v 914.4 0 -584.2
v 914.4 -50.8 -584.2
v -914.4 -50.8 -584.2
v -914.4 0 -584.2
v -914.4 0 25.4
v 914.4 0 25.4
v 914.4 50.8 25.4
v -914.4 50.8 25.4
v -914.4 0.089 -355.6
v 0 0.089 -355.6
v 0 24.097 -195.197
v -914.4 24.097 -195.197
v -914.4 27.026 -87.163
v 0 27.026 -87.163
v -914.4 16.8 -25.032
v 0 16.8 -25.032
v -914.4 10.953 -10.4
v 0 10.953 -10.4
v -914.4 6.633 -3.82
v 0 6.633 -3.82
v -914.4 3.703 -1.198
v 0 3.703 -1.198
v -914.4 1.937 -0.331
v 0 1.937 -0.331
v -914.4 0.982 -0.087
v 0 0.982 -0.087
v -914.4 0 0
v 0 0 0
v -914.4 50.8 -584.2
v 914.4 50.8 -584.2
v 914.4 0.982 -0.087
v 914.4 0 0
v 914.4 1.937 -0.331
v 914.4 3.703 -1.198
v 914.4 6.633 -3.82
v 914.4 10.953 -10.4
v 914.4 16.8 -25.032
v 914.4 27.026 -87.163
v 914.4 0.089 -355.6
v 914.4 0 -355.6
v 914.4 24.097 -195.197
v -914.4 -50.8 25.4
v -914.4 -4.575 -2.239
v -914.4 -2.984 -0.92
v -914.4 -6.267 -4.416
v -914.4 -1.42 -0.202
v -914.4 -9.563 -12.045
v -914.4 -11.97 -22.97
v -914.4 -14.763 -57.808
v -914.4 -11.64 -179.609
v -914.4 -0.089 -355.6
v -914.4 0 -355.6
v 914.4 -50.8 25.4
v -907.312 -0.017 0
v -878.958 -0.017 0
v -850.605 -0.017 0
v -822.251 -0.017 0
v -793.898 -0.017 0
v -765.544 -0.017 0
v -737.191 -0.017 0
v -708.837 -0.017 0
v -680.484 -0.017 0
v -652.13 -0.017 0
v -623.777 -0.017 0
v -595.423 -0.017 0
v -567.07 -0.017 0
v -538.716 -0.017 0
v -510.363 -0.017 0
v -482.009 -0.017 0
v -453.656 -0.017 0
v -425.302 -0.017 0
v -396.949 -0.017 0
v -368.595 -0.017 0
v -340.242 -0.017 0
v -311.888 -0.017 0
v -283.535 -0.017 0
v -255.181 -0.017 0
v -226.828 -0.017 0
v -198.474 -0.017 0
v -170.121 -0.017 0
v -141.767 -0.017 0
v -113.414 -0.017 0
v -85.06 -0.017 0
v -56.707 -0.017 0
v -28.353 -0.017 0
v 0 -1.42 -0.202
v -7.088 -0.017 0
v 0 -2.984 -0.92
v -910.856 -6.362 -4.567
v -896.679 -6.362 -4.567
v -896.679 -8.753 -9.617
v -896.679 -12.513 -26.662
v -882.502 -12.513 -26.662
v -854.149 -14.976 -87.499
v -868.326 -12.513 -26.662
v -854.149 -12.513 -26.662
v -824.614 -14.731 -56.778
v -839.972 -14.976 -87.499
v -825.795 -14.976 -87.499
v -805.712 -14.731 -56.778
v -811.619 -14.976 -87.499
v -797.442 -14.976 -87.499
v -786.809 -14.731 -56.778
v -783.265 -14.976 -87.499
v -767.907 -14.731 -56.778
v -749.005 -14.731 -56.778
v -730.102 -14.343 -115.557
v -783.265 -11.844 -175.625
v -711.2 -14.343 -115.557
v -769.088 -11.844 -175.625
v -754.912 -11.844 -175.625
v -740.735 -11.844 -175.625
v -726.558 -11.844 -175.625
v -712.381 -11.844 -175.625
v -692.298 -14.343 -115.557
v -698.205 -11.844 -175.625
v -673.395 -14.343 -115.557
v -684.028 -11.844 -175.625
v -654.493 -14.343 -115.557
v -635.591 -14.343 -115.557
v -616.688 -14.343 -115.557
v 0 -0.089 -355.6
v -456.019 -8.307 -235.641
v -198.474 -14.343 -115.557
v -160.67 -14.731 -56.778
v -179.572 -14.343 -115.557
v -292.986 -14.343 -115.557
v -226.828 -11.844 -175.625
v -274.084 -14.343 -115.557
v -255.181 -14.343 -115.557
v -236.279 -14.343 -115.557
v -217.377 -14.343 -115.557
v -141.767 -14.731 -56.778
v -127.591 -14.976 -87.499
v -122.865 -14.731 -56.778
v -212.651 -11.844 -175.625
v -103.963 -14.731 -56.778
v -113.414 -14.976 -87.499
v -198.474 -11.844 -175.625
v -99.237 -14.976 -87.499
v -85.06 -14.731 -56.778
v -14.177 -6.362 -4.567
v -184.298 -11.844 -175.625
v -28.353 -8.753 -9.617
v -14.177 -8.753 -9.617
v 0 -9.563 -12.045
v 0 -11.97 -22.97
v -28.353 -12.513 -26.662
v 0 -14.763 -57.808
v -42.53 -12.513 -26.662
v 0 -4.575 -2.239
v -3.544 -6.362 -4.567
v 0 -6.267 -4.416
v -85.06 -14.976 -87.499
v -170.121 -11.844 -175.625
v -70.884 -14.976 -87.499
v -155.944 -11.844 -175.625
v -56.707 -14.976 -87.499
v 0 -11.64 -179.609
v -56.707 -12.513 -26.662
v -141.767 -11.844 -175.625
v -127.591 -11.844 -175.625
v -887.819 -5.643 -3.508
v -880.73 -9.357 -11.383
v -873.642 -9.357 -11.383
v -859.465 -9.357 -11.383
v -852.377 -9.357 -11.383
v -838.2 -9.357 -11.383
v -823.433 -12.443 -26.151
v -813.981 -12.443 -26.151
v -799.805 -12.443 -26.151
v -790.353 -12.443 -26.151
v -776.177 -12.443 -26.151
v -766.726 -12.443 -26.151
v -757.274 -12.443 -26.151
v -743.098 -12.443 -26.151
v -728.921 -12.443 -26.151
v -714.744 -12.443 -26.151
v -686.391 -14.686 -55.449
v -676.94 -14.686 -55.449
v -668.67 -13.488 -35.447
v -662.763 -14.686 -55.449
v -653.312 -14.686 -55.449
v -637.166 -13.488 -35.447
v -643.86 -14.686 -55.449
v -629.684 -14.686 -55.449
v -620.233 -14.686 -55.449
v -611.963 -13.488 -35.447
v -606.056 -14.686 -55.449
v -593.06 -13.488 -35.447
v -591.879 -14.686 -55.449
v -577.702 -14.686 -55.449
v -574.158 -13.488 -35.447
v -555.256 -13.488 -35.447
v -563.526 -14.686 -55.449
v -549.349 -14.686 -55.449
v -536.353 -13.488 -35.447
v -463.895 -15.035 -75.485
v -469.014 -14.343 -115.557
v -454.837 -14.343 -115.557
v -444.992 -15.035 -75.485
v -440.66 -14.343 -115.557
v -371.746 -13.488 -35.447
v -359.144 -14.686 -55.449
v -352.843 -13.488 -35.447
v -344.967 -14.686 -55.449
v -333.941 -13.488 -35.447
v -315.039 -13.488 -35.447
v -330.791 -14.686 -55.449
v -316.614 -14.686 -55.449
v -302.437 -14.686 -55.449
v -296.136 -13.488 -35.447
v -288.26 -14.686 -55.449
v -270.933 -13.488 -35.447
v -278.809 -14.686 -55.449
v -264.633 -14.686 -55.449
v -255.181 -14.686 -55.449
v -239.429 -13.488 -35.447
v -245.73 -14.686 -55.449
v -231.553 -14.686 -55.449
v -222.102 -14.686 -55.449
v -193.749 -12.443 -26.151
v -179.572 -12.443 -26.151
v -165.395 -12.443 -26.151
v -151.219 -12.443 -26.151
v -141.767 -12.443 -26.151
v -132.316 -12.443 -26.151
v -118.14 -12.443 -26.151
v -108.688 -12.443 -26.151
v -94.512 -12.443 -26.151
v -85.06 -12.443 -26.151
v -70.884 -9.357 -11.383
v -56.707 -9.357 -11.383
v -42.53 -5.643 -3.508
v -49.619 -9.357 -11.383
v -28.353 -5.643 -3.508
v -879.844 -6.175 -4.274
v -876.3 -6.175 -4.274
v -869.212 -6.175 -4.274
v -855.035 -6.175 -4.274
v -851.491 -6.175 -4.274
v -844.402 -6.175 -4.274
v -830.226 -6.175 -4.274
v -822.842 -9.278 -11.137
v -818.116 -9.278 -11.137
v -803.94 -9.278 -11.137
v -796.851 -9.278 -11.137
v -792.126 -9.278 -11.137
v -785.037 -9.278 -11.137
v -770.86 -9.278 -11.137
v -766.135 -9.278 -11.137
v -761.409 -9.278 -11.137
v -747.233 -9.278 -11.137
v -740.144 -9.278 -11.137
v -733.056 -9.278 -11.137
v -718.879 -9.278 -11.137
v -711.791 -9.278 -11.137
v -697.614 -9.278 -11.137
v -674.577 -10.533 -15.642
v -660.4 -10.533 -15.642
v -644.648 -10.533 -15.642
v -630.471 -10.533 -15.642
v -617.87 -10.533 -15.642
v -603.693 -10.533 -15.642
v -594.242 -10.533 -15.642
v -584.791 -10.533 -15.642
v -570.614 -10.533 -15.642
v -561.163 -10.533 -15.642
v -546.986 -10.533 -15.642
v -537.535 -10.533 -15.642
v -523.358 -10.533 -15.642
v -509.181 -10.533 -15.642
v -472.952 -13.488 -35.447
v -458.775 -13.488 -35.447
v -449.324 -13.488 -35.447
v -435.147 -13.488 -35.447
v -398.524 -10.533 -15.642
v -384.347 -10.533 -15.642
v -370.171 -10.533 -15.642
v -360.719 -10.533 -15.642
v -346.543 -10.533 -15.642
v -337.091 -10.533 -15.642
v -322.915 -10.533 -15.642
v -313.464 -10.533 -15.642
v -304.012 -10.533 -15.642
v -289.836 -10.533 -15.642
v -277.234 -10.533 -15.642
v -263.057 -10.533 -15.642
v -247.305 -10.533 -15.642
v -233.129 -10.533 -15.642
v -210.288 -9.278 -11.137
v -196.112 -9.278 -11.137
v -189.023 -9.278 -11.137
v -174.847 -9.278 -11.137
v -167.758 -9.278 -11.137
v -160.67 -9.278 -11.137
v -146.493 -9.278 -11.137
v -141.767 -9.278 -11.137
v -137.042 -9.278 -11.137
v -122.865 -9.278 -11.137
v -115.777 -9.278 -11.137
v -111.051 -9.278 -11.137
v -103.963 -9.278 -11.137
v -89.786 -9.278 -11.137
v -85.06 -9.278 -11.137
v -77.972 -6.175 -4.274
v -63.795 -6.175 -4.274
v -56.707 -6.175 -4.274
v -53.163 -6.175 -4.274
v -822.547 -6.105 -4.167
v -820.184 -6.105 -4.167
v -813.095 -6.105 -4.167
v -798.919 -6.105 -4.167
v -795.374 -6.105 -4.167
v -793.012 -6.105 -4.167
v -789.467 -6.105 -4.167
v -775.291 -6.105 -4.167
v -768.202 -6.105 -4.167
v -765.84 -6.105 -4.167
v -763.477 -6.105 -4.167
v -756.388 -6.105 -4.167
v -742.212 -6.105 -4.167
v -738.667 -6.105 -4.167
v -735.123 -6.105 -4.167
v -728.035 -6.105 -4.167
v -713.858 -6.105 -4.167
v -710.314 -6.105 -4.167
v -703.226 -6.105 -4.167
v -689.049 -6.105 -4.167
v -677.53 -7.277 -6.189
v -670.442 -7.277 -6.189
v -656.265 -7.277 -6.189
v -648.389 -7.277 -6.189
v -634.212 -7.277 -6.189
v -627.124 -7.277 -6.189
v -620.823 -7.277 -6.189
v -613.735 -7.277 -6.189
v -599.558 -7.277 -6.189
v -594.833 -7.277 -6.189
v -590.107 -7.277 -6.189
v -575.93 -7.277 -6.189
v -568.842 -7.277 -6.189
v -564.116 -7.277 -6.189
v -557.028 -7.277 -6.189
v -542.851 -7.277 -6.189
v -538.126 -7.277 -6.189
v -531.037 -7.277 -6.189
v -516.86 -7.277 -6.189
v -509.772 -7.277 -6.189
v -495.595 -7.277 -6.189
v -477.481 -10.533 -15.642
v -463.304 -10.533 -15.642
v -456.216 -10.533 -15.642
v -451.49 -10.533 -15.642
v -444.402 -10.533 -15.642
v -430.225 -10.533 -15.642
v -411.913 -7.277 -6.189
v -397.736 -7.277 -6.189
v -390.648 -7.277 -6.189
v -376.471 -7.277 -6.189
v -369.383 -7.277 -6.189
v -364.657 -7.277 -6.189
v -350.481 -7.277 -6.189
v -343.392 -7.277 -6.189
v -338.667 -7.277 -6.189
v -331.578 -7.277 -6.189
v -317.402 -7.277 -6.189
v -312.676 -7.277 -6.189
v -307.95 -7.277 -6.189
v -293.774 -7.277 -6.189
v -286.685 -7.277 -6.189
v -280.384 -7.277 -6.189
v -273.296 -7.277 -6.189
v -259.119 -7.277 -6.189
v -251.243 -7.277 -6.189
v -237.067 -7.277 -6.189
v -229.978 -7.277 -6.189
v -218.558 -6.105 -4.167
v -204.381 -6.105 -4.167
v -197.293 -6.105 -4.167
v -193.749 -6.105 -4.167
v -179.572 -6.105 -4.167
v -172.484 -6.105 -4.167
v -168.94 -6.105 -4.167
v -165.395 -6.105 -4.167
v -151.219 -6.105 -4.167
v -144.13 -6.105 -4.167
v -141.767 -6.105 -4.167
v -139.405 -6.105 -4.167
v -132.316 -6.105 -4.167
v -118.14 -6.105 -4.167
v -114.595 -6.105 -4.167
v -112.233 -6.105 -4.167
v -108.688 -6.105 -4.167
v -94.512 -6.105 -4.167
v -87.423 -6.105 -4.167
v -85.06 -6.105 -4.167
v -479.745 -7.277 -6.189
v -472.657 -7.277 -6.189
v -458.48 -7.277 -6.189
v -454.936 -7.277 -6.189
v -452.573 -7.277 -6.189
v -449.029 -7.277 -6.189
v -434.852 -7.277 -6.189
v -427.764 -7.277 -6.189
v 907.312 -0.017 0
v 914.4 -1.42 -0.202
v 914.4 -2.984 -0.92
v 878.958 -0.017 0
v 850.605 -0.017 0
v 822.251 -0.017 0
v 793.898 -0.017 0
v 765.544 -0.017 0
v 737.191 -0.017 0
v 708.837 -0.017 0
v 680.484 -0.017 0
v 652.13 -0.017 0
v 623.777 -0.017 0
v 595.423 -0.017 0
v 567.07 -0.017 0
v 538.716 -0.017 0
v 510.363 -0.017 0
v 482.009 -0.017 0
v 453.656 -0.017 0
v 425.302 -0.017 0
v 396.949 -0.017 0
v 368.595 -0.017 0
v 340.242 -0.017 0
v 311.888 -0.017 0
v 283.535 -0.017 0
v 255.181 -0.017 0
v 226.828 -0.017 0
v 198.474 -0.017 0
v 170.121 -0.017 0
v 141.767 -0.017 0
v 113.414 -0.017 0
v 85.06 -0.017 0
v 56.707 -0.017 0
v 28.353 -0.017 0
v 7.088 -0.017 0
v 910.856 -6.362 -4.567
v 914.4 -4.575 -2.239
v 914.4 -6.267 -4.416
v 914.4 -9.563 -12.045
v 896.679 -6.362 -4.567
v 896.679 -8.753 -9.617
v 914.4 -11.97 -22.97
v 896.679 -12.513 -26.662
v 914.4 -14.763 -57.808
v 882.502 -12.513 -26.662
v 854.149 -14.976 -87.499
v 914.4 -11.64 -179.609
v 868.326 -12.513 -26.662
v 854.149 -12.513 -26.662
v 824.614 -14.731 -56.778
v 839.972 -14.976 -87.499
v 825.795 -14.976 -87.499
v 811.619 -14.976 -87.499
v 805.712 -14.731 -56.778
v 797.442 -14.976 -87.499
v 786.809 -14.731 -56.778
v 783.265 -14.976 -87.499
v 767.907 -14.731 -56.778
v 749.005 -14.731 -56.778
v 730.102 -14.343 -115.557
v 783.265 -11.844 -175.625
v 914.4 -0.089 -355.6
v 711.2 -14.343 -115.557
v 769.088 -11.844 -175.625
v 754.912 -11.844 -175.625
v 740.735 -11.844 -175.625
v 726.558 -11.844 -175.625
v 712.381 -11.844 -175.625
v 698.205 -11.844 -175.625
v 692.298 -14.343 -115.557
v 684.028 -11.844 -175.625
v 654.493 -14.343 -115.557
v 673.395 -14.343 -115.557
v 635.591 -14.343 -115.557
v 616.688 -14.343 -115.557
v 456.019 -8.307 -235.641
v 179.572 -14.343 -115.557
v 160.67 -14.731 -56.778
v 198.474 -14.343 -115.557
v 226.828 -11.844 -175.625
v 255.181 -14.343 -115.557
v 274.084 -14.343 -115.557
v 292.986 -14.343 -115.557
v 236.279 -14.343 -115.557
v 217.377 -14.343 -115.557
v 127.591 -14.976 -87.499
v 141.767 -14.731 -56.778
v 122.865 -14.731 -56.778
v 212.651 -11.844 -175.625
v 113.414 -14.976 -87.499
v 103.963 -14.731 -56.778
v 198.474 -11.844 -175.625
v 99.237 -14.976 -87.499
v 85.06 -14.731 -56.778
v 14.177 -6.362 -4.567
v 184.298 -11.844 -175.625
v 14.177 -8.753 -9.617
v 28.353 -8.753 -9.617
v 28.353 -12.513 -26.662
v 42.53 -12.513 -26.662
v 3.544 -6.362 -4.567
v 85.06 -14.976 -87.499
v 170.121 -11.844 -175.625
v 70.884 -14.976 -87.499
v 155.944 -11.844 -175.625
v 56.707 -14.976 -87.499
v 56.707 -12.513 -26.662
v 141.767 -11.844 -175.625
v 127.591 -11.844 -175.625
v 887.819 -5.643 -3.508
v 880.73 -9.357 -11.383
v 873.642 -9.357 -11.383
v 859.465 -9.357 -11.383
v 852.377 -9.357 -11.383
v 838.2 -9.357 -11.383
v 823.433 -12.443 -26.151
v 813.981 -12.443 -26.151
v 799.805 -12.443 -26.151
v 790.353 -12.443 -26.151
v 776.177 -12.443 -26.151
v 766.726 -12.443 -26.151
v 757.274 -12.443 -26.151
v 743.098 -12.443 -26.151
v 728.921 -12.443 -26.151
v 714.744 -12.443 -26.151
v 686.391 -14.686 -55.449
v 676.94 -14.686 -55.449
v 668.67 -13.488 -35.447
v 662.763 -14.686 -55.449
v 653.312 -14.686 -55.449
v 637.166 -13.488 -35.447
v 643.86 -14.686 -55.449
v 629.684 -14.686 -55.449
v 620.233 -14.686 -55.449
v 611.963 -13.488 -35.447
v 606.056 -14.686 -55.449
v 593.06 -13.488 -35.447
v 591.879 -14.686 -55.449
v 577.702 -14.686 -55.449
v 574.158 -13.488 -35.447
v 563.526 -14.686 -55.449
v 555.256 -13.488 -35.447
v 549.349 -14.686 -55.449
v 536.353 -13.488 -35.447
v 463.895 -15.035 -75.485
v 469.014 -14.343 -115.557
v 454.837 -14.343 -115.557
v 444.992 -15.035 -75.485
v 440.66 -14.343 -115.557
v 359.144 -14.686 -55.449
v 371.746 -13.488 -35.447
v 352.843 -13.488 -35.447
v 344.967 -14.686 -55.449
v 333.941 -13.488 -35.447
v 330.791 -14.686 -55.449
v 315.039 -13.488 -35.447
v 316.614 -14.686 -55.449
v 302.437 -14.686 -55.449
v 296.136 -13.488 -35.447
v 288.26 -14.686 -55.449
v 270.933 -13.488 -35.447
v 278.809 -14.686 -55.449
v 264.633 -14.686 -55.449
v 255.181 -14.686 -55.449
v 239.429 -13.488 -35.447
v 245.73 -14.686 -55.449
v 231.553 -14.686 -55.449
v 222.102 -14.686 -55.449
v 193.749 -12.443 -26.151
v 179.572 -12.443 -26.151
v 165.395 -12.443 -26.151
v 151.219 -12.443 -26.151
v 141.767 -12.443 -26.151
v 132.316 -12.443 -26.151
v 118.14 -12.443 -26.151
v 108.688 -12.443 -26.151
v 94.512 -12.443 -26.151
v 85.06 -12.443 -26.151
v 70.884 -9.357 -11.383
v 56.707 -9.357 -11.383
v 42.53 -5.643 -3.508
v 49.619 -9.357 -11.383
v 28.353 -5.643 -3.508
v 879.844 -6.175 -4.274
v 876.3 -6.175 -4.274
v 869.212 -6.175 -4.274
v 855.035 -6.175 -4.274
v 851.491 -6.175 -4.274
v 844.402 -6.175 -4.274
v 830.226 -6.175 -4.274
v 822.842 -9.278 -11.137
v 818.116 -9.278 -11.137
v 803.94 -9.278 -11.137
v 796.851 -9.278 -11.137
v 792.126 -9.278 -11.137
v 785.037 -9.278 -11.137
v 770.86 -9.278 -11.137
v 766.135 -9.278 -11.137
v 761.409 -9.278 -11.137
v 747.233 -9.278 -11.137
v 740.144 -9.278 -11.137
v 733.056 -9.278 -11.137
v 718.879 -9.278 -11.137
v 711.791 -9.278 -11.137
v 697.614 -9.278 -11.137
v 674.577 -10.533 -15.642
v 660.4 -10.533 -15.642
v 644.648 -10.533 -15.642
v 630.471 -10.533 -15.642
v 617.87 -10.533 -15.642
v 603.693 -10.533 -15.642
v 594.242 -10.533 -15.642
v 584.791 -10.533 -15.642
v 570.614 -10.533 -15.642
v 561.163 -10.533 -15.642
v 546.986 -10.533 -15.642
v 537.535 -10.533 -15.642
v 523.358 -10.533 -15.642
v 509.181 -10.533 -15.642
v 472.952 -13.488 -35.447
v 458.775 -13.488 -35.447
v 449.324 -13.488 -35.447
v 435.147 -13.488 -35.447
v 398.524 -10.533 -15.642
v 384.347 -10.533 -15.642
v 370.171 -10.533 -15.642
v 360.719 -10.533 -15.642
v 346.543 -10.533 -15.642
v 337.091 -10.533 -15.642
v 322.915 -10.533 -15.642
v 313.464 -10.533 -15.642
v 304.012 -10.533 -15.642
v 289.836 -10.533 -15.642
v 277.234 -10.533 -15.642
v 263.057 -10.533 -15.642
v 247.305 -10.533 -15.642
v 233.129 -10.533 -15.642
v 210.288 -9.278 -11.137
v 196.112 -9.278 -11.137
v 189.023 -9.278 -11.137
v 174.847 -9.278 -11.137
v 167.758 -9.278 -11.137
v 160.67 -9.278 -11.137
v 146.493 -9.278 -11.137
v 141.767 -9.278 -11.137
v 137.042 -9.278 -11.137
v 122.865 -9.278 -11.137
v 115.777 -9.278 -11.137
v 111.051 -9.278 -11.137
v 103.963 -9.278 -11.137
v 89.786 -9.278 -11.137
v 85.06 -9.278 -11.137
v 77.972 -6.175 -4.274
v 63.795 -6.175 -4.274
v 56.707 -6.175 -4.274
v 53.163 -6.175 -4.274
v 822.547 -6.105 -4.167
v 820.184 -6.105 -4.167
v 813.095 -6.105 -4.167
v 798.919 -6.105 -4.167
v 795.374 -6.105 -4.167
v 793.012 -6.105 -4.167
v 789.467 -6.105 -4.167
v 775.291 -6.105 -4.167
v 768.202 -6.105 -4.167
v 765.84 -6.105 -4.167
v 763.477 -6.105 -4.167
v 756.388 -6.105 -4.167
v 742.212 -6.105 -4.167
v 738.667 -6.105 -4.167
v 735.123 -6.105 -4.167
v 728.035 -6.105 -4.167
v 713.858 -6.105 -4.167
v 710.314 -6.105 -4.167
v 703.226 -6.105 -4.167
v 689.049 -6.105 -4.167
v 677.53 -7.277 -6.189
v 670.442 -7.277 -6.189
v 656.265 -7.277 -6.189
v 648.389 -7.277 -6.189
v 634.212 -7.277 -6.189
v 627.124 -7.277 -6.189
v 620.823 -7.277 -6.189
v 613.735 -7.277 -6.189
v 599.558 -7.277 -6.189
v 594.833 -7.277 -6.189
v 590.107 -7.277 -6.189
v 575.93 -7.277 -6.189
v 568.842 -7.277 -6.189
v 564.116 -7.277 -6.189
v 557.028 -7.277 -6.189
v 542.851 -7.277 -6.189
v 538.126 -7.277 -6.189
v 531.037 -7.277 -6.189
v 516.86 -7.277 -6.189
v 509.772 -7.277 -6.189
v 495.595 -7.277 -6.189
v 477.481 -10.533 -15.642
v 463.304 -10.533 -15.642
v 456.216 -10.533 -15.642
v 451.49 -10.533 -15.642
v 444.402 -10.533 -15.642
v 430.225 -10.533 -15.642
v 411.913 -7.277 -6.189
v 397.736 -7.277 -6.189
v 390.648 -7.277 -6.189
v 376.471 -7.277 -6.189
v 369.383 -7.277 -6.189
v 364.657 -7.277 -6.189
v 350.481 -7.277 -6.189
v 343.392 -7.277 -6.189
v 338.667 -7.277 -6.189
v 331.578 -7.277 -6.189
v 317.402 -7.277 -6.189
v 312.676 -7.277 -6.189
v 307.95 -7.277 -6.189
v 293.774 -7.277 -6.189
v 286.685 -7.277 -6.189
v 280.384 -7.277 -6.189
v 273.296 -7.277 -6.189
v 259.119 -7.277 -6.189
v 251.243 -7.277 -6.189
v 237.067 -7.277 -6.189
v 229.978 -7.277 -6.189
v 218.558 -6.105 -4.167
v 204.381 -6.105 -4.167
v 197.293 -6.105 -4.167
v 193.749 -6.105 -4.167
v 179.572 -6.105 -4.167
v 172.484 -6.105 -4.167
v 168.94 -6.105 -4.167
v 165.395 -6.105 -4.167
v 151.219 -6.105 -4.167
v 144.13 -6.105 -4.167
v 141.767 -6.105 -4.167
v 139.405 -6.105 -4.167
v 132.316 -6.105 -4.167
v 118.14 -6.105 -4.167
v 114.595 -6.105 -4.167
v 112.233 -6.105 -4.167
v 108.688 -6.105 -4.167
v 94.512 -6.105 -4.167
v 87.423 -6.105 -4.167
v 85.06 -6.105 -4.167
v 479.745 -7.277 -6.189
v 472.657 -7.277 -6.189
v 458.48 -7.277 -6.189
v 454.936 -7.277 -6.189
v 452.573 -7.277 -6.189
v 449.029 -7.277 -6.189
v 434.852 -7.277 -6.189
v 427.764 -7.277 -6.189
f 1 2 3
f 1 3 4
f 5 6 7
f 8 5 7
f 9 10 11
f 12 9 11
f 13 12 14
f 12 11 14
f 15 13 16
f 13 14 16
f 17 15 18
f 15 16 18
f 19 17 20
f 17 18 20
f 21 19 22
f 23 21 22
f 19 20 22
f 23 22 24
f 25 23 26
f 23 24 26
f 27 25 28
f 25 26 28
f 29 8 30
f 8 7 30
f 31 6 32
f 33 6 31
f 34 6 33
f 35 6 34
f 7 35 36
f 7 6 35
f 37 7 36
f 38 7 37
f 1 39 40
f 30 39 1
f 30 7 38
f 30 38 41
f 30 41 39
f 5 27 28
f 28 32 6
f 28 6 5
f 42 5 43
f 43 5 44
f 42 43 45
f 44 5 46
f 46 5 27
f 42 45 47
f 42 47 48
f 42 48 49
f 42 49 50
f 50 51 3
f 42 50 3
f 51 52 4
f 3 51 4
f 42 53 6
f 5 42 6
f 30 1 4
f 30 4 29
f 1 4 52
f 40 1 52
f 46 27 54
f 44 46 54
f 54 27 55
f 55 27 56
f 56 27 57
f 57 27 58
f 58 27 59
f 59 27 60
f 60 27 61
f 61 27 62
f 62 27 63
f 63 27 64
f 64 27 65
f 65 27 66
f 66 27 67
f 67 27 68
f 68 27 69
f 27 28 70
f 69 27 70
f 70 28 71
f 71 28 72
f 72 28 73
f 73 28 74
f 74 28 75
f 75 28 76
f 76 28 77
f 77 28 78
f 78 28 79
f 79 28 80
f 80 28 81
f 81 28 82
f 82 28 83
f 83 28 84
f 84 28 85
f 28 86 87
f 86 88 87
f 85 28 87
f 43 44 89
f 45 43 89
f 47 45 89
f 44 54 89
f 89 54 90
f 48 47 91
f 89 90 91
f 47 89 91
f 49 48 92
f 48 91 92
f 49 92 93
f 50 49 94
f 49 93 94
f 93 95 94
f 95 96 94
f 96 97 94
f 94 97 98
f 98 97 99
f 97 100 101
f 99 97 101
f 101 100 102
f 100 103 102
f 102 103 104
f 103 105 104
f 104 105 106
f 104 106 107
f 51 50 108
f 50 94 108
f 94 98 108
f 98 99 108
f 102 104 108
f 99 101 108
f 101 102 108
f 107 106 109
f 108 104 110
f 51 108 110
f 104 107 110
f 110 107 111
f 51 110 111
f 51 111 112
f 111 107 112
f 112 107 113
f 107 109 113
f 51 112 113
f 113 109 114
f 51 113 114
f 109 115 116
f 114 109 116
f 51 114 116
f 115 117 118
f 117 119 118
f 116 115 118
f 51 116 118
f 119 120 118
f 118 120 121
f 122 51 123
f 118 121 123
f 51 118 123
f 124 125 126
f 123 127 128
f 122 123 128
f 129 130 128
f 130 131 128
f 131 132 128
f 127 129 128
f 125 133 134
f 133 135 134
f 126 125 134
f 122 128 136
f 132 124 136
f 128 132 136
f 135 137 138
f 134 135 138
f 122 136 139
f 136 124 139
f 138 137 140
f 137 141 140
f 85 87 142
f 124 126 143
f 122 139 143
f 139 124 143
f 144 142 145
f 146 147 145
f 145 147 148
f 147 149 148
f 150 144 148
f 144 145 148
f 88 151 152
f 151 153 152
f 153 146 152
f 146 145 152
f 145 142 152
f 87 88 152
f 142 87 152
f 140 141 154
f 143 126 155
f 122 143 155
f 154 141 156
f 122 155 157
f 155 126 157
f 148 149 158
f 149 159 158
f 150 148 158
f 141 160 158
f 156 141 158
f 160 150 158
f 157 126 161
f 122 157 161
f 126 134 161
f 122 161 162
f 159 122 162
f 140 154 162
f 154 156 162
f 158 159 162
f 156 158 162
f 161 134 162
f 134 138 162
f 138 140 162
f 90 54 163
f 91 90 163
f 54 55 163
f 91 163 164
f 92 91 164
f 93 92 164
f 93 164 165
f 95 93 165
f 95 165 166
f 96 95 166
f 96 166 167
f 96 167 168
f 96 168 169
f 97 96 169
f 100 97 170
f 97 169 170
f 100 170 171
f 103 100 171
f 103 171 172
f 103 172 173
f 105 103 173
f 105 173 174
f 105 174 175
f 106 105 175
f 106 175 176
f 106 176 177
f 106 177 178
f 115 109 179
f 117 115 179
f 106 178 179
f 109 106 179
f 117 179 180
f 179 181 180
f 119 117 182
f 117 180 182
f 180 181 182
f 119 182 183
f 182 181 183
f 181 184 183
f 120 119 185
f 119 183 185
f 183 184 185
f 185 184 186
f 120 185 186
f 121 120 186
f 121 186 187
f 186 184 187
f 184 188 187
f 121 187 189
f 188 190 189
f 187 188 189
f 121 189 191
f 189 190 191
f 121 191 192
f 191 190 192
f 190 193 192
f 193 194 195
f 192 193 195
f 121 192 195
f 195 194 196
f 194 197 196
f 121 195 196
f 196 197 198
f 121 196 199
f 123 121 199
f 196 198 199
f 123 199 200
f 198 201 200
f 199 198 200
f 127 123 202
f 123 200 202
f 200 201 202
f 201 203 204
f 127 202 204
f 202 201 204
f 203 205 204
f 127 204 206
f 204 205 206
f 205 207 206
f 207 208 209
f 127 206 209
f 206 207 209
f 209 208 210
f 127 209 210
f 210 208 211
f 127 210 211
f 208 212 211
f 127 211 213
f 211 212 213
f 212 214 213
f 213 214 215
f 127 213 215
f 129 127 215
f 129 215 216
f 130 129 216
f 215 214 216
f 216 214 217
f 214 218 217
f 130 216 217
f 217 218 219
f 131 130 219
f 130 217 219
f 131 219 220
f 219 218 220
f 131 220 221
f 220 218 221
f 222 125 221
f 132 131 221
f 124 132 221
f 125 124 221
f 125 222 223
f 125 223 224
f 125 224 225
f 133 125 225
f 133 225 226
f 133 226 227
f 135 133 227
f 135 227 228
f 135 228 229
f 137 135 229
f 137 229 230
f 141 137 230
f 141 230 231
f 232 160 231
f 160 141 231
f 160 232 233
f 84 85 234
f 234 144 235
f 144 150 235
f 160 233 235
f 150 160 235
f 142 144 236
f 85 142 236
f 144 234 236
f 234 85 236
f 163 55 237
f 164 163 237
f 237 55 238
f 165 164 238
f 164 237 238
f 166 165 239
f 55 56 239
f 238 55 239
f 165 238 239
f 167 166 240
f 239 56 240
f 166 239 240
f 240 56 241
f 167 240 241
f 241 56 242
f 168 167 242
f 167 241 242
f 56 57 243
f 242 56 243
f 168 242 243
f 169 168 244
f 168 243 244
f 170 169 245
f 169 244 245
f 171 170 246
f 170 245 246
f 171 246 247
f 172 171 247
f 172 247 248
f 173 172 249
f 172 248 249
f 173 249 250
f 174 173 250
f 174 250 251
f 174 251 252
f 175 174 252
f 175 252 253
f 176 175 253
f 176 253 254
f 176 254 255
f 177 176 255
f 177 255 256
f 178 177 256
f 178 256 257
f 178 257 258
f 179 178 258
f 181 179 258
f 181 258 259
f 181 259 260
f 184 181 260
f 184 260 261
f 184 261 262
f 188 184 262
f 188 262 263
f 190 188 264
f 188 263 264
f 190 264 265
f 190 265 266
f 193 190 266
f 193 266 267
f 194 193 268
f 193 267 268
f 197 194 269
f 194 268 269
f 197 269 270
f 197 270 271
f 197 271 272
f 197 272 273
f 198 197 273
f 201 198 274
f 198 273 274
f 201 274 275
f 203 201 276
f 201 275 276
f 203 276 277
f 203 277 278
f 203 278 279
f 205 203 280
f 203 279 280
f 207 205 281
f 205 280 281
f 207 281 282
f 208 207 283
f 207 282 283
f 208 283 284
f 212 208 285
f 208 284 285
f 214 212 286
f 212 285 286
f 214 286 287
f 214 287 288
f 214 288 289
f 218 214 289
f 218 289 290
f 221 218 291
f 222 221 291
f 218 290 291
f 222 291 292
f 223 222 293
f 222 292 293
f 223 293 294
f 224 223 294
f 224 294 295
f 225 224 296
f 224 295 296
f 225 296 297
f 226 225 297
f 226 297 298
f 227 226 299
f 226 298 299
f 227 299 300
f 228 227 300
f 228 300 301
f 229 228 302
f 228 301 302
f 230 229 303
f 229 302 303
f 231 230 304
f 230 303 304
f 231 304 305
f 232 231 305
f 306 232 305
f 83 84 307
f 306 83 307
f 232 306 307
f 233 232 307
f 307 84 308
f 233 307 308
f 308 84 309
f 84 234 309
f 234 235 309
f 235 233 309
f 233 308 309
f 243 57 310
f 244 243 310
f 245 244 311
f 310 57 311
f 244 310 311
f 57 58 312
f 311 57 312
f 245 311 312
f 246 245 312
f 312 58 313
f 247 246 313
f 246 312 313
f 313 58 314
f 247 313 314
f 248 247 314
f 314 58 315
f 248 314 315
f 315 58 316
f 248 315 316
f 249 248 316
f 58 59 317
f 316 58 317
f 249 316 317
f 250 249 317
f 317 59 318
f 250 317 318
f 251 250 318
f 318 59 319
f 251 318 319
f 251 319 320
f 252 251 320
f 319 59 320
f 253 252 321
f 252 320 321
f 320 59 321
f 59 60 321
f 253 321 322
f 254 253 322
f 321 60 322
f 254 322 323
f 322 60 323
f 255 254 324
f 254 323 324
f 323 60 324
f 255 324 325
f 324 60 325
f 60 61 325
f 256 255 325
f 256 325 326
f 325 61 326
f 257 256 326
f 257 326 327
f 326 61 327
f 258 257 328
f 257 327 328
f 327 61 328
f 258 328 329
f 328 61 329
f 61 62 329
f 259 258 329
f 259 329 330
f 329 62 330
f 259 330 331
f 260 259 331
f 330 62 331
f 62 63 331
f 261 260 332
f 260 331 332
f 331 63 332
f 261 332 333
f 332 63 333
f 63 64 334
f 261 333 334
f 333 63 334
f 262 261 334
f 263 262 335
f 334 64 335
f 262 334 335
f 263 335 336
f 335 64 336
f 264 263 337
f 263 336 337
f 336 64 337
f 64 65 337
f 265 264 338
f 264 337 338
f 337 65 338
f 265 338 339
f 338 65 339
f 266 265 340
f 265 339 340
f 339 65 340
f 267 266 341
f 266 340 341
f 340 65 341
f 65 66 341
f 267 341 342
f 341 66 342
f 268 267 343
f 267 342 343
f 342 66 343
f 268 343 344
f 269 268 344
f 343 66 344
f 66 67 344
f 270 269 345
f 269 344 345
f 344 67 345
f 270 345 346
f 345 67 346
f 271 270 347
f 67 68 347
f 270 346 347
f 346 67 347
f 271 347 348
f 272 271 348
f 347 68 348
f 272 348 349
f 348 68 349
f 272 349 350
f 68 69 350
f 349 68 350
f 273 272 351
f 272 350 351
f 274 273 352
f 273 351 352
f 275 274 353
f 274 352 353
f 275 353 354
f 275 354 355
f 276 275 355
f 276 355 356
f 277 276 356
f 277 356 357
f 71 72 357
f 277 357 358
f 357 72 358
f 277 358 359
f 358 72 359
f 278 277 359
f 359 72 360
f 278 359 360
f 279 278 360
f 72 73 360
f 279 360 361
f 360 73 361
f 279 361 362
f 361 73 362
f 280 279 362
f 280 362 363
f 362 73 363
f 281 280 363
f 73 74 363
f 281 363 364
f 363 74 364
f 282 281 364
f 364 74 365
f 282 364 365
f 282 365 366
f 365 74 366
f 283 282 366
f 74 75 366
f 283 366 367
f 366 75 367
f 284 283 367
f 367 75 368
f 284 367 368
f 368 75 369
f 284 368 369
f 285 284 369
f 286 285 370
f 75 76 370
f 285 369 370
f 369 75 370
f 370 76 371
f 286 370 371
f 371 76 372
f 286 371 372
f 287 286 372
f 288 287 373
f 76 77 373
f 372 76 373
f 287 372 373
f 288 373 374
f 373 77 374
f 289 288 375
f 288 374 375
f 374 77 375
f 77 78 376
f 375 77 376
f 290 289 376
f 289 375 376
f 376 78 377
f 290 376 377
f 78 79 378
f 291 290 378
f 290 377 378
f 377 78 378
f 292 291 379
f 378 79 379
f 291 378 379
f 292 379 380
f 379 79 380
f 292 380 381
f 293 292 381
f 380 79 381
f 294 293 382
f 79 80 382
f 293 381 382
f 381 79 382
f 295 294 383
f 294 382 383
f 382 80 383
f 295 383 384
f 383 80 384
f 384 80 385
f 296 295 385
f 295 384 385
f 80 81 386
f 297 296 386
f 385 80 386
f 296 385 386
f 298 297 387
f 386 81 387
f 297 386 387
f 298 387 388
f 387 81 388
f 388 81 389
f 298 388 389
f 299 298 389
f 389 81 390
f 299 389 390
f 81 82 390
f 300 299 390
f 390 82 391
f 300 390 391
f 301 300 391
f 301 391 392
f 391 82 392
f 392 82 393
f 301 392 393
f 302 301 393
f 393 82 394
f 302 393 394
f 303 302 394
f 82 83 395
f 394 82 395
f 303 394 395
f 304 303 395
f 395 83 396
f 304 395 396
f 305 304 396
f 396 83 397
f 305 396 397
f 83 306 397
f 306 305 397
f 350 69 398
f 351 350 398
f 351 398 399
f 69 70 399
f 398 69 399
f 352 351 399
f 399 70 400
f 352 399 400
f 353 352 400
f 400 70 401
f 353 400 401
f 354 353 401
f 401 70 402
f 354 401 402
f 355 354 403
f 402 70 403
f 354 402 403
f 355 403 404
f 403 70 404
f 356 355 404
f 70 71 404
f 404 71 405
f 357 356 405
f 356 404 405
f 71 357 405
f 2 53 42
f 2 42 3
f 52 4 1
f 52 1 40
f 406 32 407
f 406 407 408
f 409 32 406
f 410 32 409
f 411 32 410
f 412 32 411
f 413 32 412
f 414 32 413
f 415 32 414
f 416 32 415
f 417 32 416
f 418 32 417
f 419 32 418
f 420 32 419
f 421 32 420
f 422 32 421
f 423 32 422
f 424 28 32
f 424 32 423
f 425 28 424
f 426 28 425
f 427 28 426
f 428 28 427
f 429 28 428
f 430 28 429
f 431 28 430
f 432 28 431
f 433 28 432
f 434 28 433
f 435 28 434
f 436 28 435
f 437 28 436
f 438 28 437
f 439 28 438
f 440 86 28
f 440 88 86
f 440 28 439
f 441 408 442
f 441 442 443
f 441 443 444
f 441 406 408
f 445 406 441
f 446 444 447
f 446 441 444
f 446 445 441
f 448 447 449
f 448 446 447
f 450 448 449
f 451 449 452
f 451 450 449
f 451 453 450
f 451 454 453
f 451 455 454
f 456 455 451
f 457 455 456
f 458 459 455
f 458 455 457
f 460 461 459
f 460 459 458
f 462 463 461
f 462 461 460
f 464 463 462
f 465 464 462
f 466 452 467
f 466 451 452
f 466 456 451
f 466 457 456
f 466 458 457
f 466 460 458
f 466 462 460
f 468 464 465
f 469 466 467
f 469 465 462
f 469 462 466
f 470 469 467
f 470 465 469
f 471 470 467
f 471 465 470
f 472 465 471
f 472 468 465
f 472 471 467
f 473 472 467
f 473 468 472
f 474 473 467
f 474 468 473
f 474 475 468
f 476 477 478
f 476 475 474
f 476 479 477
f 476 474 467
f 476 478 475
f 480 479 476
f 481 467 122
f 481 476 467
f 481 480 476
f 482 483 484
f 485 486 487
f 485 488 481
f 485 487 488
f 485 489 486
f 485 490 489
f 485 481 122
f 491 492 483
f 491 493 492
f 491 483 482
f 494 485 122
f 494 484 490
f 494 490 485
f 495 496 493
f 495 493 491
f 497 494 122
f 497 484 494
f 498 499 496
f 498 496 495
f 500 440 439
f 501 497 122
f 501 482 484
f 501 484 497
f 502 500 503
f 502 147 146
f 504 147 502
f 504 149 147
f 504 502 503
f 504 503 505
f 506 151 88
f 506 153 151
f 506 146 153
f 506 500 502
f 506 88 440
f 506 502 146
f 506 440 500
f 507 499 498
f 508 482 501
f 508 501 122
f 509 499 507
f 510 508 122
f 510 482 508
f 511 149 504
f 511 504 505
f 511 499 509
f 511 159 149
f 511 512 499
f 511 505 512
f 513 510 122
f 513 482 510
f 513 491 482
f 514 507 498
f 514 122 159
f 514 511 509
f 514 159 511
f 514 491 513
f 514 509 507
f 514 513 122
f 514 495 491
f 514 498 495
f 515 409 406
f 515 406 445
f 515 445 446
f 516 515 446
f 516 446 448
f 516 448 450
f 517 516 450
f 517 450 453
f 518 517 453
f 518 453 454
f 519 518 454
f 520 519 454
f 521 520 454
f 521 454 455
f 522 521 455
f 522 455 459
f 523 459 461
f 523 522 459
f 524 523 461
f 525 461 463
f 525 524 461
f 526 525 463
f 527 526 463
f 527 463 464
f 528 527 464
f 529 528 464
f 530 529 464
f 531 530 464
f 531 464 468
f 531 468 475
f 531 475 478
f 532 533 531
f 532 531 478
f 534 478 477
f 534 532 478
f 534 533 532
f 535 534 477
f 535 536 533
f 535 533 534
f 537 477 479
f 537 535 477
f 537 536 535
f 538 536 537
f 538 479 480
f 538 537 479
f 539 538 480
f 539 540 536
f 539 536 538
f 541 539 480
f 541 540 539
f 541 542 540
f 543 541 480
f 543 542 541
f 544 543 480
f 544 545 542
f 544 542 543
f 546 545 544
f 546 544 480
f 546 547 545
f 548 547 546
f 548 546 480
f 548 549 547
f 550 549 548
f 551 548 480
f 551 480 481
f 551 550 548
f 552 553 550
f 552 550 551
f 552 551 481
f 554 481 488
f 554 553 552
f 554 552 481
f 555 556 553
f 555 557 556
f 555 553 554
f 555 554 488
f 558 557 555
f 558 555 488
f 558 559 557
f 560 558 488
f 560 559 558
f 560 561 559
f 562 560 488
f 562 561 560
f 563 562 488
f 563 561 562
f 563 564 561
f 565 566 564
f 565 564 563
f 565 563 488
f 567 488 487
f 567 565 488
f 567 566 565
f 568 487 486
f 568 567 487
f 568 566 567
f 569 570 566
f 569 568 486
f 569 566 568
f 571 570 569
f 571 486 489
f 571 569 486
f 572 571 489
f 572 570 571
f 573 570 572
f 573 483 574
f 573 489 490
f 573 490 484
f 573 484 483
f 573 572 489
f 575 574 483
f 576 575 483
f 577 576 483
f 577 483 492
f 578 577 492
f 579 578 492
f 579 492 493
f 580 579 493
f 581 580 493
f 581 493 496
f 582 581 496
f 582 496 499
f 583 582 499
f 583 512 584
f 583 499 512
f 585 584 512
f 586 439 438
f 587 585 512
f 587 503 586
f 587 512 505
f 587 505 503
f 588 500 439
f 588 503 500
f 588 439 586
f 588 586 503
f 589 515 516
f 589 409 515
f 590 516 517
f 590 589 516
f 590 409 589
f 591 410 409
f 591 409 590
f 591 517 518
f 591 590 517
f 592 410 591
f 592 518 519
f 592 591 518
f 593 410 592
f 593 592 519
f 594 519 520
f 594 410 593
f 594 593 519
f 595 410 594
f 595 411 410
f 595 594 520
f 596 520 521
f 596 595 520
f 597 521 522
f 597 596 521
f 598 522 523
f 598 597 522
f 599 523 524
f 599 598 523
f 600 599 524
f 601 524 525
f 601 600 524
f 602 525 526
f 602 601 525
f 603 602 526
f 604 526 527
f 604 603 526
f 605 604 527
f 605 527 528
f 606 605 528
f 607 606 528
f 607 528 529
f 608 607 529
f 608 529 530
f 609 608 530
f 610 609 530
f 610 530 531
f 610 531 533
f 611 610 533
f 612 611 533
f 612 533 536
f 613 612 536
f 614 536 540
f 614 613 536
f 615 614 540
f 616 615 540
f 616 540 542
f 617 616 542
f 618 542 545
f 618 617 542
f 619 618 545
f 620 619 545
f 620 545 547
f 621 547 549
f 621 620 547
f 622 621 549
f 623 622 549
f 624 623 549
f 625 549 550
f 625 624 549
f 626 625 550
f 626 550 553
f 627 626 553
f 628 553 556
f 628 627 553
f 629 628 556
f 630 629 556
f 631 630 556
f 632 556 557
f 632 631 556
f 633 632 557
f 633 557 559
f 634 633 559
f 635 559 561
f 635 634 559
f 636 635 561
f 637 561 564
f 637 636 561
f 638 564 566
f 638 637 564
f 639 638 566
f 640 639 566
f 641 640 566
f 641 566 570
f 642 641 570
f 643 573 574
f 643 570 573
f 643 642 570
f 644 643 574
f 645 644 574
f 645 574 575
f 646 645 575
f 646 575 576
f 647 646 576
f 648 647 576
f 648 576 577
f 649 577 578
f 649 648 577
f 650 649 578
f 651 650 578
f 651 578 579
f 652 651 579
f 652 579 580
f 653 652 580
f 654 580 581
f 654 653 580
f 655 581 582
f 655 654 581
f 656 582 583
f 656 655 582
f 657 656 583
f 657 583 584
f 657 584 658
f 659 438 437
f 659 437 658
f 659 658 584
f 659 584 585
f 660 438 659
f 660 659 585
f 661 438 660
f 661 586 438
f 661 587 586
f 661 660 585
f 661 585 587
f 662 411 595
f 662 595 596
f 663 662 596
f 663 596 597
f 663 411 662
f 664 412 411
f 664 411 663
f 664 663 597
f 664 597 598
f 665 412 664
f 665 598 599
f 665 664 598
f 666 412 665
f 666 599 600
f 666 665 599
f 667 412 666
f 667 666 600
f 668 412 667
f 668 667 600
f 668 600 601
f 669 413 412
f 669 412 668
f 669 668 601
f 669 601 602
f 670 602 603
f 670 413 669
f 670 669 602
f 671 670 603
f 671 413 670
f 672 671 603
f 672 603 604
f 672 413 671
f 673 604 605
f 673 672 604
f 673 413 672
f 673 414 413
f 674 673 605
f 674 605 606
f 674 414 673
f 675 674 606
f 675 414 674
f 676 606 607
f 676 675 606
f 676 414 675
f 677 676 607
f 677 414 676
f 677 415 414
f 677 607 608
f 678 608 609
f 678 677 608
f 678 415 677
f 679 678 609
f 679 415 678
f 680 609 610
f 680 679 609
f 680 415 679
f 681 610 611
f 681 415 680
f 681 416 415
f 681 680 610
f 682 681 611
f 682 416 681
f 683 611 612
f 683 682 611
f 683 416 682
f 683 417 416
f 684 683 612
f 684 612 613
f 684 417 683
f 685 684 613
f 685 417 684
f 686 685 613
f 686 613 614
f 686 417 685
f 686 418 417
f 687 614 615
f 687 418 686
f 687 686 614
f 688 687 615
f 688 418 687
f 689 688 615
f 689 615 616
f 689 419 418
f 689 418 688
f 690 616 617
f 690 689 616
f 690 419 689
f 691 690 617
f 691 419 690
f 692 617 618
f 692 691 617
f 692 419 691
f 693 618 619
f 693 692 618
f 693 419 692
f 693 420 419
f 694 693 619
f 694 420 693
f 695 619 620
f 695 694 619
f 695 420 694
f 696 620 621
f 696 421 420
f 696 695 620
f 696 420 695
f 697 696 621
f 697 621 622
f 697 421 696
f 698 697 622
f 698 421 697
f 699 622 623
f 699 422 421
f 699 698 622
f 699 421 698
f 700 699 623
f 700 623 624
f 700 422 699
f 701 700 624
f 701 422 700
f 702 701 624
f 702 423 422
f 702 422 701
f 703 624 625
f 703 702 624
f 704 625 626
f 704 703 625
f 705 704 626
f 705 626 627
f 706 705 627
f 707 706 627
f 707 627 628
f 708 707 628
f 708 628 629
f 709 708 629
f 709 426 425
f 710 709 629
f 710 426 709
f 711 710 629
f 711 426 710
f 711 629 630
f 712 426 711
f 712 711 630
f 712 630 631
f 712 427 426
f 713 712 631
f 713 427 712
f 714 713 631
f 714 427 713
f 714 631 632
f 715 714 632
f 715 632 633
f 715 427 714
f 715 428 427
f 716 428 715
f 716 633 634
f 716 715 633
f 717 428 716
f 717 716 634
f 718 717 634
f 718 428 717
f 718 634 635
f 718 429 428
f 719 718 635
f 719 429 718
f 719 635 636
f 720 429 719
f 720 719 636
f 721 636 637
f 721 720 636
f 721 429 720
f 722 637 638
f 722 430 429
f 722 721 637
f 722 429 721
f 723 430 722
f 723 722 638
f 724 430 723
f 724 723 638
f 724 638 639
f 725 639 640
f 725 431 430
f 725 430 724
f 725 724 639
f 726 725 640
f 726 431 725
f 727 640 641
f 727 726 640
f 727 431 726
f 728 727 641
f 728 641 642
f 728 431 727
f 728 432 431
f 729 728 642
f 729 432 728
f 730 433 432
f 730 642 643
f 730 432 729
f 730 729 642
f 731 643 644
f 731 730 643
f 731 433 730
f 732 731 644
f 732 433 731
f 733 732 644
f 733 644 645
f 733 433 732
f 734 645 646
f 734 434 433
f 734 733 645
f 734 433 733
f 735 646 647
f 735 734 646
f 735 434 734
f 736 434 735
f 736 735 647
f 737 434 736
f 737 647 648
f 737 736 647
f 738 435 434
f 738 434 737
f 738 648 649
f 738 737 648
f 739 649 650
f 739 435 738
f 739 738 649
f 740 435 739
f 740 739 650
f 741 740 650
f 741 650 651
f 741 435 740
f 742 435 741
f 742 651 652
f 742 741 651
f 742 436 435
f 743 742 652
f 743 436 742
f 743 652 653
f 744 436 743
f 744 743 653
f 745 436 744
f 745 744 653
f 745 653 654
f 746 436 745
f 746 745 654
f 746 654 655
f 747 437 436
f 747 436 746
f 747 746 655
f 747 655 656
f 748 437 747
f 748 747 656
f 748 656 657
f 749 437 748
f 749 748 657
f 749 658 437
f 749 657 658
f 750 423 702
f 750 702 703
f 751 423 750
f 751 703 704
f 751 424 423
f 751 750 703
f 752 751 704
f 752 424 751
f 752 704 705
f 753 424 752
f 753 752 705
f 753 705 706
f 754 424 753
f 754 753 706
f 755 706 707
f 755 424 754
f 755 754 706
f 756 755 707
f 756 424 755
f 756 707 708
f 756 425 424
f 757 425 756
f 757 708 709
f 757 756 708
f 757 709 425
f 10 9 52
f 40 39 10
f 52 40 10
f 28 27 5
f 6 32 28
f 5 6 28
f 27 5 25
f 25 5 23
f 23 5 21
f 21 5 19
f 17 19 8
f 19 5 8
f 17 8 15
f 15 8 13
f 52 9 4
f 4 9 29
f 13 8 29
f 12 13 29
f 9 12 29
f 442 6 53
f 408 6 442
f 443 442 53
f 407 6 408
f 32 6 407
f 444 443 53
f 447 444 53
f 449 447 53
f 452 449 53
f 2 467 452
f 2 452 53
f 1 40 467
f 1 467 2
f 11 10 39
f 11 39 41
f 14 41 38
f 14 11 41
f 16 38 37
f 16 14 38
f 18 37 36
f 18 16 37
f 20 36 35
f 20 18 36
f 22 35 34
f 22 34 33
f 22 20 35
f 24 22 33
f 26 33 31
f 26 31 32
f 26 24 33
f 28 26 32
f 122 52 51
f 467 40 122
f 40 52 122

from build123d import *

# Parameters (mm, degrees)
SKETCH1_W           = 609.6
SKETCH1_H           = 101.6
BOSS_EXTRUDE1_DEPTH = 914.4


with BuildPart() as part:
    # Sketch1 → Boss-Extrude1 (new, symmetric)
    with BuildSketch(Plane(origin=(0, 0, 0), x_dir=(0, 0, -1), z_dir=(1, 0, 0))):
        with Locations((279.4, 0)):
            Rectangle(SKETCH1_W, SKETCH1_H)
        with BuildLine():
            Line((355.599995778, 0.088899993), (355.600004222, -0.088899993))
            add(Edge.make_bspline(
                [(355.599995778, 0.088899993), (353.719919628, 0.484485581), (349.962916086, 1.274994229), (344.321357204, 2.408274034), (338.683668583, 3.512244286), (333.050236726, 4.587785987), (327.422693692, 5.639432655), (321.802334741, 6.668857961), (314.329135268, 8.011385096), (303.170369871, 9.958422722), (290.194287361, 12.107358077), (277.289771757, 14.118748691), (266.32724231, 15.739151064), (251.90729176, 17.753444463), (237.620805882, 19.578238431), (223.484571155, 21.221203013), (213.079958676, 22.35244674), (202.818953541, 23.390777248), (192.711844061, 24.335220131), (182.768771906, 25.183158052), (172.999706974, 25.930638246), (161.8755037, 26.675974905), (149.491704209, 27.346118936), (135.950809215, 27.840399909), (122.906863741, 28.059891495), (110.38955742, 28.000634334), (99.672207938, 27.700985353), (90.667971982, 27.262292799), (83.279992978, 26.775857592), (76.166179431, 26.181085385), (69.333698868, 25.483651689), (62.78942488, 24.68967134), (56.539916188, 23.805557546), (50.591433903, 22.837910647), (44.949952532, 21.793499475), (39.621112912, 20.679278548), (35.38459791, 19.684279107), (31.410842402, 18.666344518), (28.39403653, 17.828103782), (25.494164793, 16.950750808), (23.438681715, 16.293491786), (21.46678011, 15.626915769), (19.578952701, 14.951912739), (17.775664606, 14.269365904), (16.057362792, 13.580122722), (14.424466236, 12.885010511), (12.877370576, 12.184822001), (11.41645423, 11.480293146), (10.042056179, 10.772140432), (8.754511409, 10.060984054), (7.554107415, 9.347425864), (6.441119863, 8.631976574), (5.415793041, 7.915079727), (4.478345909, 7.197107261), (3.628976492, 6.478343988), (2.867864561, 5.758991675), (2.195190165, 5.03915146), (1.611133495, 4.318845026), (1.115921313, 3.59800481), (0.709825307, 2.87650933), (0.393271271, 2.15423771), (0.166504254, 1.431146413), (0.030737644, 0.707331331), (-0.01510981, 0.002329326), (0.030103712, -0.683215048), (0.166757283, -1.346959587), (0.393300202, -2.005722915), (0.709982051, -2.657303726), (1.116181328, -3.299762384), (1.611583629, -3.931365111), (2.19588676, -4.550541061), (2.868853595, -5.155873444), (3.630284522, -5.746072074), (4.479990283, -6.319989017), (5.41777842, -6.876617983), (6.443440476, -7.415118179), (7.556746328, -7.934809954), (8.757450602, -8.435162267), (10.04527274, -8.915818462), (11.419918332, -9.376544391), (12.881056499, -9.817279011), (14.428342684, -10.238048563), (16.061401534, -10.639008832), (17.779837371, -11.020391175), (19.583230149, -11.382503507), (21.471138203, -11.72569046), (23.443096697, -12.050327435), (25.498615858, -12.356818022), (27.637186796, -12.645541454), (29.858278076, -12.916863624), (32.161337168, -13.17112178), (35.392871871, -13.492971246), (39.633515491, -13.851127367), (44.961680314, -14.209933523), (50.602431788, -14.504901453), (56.550155093, -14.736048774), (62.798888687, -14.903214972), (69.342369229, -15.006422563), (76.174024321, -15.046294155), (83.286967172, -15.024333631), (90.674025931, -14.943132189), (98.327760574, -14.806320398), (106.240488655, -14.618358339), (114.404261409, -14.384158225), (122.810873499, -14.108588395), (131.451881899, -13.795890053), (140.318604404, -13.449239271), (149.402126747, -13.070337509), (161.921237989, -12.516505896), (174.697664724, -11.901159381), (187.718132989, -11.217108995), (197.744296345, -10.659602088), (207.929345735, -10.062346652), (220.025511725, -9.319207642), (232.279253589, -8.53057328), (244.678709307, -7.712713438), (255.449825815, -6.996932102), (264.490823064, -6.397512526), (273.609082441, -5.796208069), (282.795452689, -5.193636154), (293.872010722, -4.467502283), (303.143053311, -3.850890022), (310.58793423, -3.34310816), (316.18970464, -2.95303736), (321.801365046, -2.553083045), (327.421479554, -2.143029396), (333.048603174, -1.724268081), (338.681282888, -1.299908993), (344.318125247, -0.877582287), (349.957440029, -0.463228733), (353.719205679, -0.213672512), (355.600004222, -0.088899993)],
                knots=[0, 0, 0, 0, 0.007940543, 0.015867786, 0.023782336, 0.031683842, 0.039571466, 0.047443805, 0.055299407, 0.070952907, 0.094259966, 0.109659749, 0.124931368, 0.140060475, 0.169836167, 0.184455938, 0.198878988, 0.213091981, 0.227081364, 0.240833733, 0.254335896, 0.267574898, 0.286913018, 0.305591757, 0.323574751, 0.340828862, 0.357323531, 0.367884026, 0.378086462, 0.387923234, 0.397387015, 0.406470797, 0.41516795, 0.423472244, 0.43137777, 0.438879022, 0.445971139, 0.449362331, 0.455832514, 0.458910652, 0.461883669, 0.464751272, 0.467513247, 0.470169459, 0.472719872, 0.475164567, 0.477503762, 0.479737826, 0.481867333, 0.483893084, 0.485816152, 0.487637951, 0.489360303, 0.49098553, 0.492516542, 0.493957004, 0.495311466, 0.496585561, 0.4977862, 0.498921787, 0.500002352, 0.50103964, 0.502046987, 0.503038995, 0.503951731, 0.504878158, 0.505831393, 0.506823576, 0.507865603, 0.508967032, 0.510136107, 0.511379885, 0.512704371, 0.51411466, 0.515615093, 0.517209348, 0.518900571, 0.520691419, 0.522584144, 0.524580638, 0.526682478, 0.528890964, 0.531207133, 0.533631806, 0.536165599, 0.538808937, 0.541562081, 0.544425147, 0.547398108, 0.550480817, 0.553673027, 0.556974385, 0.563902733, 0.571261381, 0.579045037, 0.58724742, 0.595861595, 0.604880098, 0.614294871, 0.624097261, 0.634278056, 0.644827522, 0.655735355, 0.666990799, 0.678582536, 0.690498843, 0.702727789, 0.715257042, 0.728074047, 0.754520377, 0.768123571, 0.781962351, 0.796022904, 0.810291085, 0.832050541, 0.846772874, 0.861649926, 0.876666219, 0.884221743, 0.899417941, 0.914715475, 0.9300999, 0.937820202, 0.945556969, 0.953308312, 0.961072259, 0.968846879, 0.976629764, 0.984418334, 0.992209516, 1, 1, 1, 1], degree=3))
        make_face(mode=Mode.SUBTRACT)
    extrude(amount=BOSS_EXTRUDE1_DEPTH, both=True)


with BuildPart() as body_2:
    # Split1: the piece on the far side of the plane
    add(part.part)
    split(bisect_by=Plane.ZX, keep=Keep.BOTTOM)


with BuildPart() as part_1:
    add(part.part)

    # Split1
    split(bisect_by=Plane.ZX, keep=Keep.TOP)


solid = Compound([body_2.part, part_1.part])
